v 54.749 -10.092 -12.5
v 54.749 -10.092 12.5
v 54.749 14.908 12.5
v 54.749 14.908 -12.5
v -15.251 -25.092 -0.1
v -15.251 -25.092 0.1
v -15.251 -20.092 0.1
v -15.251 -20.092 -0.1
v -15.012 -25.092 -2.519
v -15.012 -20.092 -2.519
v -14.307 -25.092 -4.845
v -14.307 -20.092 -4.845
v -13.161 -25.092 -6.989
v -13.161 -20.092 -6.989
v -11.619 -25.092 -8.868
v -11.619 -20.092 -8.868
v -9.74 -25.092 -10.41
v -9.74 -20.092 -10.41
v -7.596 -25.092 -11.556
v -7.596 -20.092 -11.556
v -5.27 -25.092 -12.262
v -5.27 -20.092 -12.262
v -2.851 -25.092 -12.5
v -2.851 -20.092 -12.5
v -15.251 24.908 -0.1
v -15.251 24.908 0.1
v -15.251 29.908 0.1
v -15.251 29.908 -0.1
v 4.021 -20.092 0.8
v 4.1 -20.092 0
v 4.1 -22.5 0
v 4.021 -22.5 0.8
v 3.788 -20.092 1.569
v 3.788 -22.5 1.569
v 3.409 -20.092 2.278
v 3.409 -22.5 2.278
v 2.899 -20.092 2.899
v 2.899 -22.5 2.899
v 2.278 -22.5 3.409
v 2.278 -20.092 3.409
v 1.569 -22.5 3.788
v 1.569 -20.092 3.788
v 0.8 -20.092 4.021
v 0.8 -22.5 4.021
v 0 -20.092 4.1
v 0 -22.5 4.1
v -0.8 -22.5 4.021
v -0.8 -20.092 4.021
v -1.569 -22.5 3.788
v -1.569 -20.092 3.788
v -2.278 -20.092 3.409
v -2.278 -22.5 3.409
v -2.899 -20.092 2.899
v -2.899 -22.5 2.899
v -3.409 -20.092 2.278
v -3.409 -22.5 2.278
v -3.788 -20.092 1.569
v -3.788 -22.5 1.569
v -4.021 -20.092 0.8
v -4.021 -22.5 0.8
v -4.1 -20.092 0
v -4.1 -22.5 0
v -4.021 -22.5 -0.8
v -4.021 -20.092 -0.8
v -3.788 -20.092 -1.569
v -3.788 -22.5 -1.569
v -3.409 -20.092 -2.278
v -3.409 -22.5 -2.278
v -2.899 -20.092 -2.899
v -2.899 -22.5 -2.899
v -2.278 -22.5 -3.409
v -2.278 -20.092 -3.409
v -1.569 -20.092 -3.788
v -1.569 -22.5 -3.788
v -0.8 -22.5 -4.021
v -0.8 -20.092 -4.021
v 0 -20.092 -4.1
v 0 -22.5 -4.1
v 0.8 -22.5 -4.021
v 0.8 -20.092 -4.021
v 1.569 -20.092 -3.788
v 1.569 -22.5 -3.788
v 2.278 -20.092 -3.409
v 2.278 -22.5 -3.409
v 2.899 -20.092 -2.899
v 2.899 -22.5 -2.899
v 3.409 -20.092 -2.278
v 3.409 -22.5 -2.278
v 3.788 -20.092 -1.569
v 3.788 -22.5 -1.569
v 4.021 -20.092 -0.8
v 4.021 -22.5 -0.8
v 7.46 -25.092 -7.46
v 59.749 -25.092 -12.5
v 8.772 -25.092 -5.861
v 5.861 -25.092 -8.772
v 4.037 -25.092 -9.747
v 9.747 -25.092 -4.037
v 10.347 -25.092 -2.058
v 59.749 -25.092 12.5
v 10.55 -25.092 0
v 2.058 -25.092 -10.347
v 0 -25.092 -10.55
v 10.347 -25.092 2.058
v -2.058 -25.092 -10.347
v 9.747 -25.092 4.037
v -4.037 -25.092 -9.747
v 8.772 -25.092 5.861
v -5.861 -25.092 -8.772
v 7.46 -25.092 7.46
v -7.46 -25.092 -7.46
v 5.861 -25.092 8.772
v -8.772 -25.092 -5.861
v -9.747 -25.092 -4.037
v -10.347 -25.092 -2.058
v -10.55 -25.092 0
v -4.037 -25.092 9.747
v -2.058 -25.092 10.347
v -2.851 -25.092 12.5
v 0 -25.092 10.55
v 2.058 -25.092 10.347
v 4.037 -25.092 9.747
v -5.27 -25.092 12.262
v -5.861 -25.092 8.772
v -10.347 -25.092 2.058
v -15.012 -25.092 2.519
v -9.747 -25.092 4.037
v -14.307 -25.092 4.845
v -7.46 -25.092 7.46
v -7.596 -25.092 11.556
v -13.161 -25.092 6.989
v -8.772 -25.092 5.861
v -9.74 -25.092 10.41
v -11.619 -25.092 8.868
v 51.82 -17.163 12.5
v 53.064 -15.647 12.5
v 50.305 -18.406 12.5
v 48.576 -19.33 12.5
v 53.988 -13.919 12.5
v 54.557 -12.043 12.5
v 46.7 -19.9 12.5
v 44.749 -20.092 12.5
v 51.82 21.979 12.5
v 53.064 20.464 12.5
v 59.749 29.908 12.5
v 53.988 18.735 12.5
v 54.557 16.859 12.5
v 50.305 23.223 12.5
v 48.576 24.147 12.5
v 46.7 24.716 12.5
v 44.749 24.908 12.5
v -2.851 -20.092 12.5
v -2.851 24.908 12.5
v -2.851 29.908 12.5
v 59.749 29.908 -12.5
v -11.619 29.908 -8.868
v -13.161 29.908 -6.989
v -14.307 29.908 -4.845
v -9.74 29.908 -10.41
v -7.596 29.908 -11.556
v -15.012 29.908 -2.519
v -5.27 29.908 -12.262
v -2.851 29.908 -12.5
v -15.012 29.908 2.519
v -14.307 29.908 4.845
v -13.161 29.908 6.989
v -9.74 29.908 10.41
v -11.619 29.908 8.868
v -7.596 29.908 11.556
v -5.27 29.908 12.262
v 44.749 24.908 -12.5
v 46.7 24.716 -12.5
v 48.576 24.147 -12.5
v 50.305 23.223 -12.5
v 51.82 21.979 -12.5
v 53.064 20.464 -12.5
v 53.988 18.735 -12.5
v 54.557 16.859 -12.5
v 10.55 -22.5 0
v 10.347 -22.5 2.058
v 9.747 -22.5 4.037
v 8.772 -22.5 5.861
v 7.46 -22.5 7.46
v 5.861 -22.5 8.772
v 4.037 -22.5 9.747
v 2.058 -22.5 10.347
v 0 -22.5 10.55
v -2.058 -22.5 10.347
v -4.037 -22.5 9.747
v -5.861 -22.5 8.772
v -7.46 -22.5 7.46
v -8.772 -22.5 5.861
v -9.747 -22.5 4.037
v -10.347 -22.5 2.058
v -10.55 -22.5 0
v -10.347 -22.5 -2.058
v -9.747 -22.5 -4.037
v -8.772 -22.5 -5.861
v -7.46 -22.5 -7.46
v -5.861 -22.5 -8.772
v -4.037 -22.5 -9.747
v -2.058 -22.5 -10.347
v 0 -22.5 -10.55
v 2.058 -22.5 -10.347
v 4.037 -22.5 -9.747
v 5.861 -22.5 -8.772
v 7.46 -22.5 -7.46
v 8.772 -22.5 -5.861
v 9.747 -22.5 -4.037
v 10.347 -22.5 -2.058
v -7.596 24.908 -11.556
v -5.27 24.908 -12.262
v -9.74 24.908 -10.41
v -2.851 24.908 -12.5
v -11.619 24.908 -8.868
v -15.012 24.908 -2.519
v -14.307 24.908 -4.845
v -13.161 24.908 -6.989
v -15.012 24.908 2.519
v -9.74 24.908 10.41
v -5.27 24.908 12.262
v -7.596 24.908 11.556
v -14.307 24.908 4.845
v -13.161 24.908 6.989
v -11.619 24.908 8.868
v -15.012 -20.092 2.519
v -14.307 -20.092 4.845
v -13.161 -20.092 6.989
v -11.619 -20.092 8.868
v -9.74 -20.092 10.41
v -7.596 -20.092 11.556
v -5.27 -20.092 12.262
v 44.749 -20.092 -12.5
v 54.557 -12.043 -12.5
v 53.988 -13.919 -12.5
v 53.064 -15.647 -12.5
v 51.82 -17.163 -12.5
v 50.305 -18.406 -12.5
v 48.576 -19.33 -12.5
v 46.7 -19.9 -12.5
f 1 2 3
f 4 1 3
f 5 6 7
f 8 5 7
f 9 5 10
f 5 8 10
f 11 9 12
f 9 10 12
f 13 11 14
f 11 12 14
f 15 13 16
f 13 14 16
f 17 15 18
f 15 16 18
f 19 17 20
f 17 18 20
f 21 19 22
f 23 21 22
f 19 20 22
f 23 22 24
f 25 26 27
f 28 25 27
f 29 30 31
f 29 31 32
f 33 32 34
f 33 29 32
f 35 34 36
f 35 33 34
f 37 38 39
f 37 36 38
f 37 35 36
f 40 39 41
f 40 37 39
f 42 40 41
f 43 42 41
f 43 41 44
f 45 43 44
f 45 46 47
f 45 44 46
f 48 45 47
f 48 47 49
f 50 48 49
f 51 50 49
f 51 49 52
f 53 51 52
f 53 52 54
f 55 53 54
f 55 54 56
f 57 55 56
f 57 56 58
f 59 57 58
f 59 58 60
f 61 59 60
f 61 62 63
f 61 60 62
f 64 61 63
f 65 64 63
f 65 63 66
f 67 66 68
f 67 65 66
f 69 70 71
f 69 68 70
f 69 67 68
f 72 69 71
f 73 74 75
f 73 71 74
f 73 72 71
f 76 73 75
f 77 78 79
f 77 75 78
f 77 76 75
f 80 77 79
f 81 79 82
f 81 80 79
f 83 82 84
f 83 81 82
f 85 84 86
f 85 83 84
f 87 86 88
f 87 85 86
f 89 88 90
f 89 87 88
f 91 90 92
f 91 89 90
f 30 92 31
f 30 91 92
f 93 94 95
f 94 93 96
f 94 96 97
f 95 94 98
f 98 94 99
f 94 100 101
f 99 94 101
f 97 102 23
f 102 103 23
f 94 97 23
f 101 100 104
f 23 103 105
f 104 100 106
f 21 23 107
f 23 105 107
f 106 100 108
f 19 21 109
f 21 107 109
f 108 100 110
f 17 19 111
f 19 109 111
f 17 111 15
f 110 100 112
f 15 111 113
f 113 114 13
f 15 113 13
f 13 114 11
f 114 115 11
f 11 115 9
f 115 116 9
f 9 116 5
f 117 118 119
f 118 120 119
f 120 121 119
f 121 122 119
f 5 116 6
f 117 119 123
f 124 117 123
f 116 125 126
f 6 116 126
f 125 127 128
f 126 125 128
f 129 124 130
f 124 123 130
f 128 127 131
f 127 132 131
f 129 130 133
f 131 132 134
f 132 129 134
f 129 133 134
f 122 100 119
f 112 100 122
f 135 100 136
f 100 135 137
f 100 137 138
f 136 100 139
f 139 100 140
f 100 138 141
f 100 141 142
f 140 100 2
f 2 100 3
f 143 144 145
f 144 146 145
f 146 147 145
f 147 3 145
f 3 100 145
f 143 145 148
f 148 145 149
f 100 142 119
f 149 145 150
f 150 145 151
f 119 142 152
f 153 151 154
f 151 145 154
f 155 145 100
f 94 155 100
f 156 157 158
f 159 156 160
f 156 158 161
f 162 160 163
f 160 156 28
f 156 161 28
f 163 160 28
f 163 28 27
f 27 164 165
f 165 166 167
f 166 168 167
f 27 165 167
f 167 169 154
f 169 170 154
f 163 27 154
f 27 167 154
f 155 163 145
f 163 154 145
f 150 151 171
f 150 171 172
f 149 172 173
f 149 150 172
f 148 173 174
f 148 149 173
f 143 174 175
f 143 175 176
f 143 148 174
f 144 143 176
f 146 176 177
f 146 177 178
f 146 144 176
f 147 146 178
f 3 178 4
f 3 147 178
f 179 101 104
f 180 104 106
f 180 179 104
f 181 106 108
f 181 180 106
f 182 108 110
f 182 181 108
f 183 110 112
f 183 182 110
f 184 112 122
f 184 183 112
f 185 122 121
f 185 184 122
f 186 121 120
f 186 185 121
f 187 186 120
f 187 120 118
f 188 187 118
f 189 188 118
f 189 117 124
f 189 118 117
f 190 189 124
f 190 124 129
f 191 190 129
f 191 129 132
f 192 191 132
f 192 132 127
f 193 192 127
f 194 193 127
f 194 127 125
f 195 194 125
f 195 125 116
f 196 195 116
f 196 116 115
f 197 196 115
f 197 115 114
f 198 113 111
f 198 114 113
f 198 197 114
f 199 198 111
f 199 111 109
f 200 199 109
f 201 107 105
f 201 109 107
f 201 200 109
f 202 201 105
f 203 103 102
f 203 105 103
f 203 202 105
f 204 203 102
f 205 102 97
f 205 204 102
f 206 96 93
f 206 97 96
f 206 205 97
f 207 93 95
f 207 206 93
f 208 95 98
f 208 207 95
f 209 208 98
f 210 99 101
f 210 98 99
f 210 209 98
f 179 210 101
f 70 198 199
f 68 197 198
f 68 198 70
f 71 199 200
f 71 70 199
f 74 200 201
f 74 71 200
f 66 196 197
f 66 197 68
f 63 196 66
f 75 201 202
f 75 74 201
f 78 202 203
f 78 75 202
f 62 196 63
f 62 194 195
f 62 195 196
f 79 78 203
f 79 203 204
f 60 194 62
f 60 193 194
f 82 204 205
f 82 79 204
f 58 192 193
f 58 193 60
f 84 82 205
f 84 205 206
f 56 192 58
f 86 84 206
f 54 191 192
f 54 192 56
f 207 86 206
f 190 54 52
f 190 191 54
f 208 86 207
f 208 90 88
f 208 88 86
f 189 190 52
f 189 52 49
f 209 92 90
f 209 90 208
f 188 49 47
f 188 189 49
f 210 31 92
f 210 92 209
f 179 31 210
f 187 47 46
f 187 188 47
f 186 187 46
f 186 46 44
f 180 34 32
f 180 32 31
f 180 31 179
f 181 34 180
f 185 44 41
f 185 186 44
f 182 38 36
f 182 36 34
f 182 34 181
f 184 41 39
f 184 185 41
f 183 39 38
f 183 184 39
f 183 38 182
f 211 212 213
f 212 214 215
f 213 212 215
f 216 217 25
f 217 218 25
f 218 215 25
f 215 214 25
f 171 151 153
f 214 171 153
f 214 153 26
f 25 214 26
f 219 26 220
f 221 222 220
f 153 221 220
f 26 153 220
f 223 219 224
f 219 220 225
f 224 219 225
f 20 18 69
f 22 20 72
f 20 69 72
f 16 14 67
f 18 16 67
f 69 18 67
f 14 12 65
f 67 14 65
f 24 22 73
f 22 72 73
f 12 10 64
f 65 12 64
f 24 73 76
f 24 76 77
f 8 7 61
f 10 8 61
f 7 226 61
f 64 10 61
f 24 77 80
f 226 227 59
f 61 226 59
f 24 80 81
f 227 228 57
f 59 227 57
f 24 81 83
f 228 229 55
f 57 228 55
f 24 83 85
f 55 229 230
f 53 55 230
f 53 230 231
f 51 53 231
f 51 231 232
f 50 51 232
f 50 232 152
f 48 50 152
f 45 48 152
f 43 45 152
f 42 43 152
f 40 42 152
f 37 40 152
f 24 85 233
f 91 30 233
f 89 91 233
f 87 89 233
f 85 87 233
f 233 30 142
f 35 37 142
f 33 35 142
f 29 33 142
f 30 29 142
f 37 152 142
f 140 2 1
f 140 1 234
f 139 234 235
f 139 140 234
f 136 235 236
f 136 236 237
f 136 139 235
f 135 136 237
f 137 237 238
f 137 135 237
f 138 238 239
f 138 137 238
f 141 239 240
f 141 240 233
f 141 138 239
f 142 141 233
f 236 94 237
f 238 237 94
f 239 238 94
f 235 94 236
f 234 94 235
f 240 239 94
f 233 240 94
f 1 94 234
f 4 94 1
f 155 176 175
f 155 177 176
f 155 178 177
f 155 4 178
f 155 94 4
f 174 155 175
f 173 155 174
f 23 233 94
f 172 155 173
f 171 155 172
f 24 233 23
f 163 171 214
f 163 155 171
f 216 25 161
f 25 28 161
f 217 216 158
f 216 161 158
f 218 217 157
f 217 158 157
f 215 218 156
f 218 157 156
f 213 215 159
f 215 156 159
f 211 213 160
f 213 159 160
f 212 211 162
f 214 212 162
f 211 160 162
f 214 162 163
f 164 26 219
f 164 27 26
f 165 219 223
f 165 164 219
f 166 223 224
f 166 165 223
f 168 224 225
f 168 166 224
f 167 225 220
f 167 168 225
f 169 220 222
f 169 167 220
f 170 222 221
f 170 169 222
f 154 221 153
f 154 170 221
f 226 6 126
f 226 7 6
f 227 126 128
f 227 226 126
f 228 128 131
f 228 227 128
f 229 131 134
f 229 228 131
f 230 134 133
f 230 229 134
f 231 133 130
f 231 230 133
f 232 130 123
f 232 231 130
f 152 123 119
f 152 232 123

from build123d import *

# Parameters (mm, degrees)
CYLINDER018_R          = 4.1
CYLINDER018_DEPTH      = 10
CYLINDER018_ROLL_ANGLE = 90
CYLINDER016_R          = 10.55
CYLINDER016_DEPTH      = 10
CYLINDER016_ROLL_ANGLE = 90
PAD005_DEPTH           = 25
FILLET008_R            = 12.4


with BuildPart() as cilindro018:
    # Cylinder018 → Cylinder018 (new body)
    with BuildSketch(Plane.XY):
        Circle(CYLINDER018_R)
    extrude(amount=CYLINDER018_DEPTH)


with BuildPart() as cilindro018_1:
    # Cylinder018 roll: moved
    add(cilindro018.part.rotate(Axis((0, 0, 0), (1, 0, 0)), CYLINDER018_ROLL_ANGLE))


with BuildPart() as cilindro018_2:
    # Cylinder018 placement: moved
    add(cilindro018_1.part.moved(Location((0, -14, 0))))


with BuildPart() as taladro_horm001:
    # Cylinder016 → Cylinder016 (new body)
    with BuildSketch(Plane.XY):
        Circle(CYLINDER016_R)
    extrude(amount=CYLINDER016_DEPTH)


with BuildPart() as taladro_horm001_1:
    # Cylinder016 roll: moved
    add(taladro_horm001.part.rotate(Axis((0, 0, 0), (1, 0, 0)), CYLINDER016_ROLL_ANGLE))


with BuildPart() as taladro_horm001_2:
    # Cylinder016 placement: moved
    add(taladro_horm001_1.part.moved(Location((0, -22.5, 0))))

    # Fusion002: union Cilindro018
    add(cilindro018_2.part)


with BuildPart() as cut023004:
    # Sketch005 → Pad005 (new body)
    with BuildSketch(Plane(origin=(0, 0, 12.5), x_dir=(-1, 0, 0), z_dir=(0, 0, -1))):
        with BuildLine():
            Line((-59.749396, 29.9083), (-59.749396, -25.0917))
            Line((-59.749396, -25.0917), (15.250604, -25.0917))
            Line((15.250604, -25.0917), (15.250604, -20.0917))
            Line((15.250604, -20.0917), (-44.749396, -20.0917))
            ThreePointArc((-54.749396, -10.0917), (-51.820464, -17.162768), (-44.749396, -20.0917))
            Line((-54.749396, -10.0917), (-54.749396, 14.9083))
            ThreePointArc((-44.749396, 24.9083), (-51.820464, 21.979368), (-54.749396, 14.9083))
            Line((-44.749396, 24.9083), (15.250604, 24.9083))
            Line((15.250604, 24.9083), (15.250604, 29.9083))
            Line((15.250604, 29.9083), (-59.749396, 29.9083))
        make_face()
    extrude(amount=PAD005_DEPTH)

    # Fillet008
    fillet008_edges = [cut023004.edges().sort_by_distance(p)[0] for p in [
        (-15.250604, 27.4083, 12.5),
        (-15.250604, 27.4083, -12.5),
        (-15.250604, -22.5917, 12.5),
        (-15.250604, -22.5917, -12.5),
    ]]
    fillet(fillet008_edges, radius=FILLET008_R)

    # Cut023004: cut Taladro-horm001
    add(taladro_horm001_2.part, mode=Mode.SUBTRACT)


solid = cut023004.part
